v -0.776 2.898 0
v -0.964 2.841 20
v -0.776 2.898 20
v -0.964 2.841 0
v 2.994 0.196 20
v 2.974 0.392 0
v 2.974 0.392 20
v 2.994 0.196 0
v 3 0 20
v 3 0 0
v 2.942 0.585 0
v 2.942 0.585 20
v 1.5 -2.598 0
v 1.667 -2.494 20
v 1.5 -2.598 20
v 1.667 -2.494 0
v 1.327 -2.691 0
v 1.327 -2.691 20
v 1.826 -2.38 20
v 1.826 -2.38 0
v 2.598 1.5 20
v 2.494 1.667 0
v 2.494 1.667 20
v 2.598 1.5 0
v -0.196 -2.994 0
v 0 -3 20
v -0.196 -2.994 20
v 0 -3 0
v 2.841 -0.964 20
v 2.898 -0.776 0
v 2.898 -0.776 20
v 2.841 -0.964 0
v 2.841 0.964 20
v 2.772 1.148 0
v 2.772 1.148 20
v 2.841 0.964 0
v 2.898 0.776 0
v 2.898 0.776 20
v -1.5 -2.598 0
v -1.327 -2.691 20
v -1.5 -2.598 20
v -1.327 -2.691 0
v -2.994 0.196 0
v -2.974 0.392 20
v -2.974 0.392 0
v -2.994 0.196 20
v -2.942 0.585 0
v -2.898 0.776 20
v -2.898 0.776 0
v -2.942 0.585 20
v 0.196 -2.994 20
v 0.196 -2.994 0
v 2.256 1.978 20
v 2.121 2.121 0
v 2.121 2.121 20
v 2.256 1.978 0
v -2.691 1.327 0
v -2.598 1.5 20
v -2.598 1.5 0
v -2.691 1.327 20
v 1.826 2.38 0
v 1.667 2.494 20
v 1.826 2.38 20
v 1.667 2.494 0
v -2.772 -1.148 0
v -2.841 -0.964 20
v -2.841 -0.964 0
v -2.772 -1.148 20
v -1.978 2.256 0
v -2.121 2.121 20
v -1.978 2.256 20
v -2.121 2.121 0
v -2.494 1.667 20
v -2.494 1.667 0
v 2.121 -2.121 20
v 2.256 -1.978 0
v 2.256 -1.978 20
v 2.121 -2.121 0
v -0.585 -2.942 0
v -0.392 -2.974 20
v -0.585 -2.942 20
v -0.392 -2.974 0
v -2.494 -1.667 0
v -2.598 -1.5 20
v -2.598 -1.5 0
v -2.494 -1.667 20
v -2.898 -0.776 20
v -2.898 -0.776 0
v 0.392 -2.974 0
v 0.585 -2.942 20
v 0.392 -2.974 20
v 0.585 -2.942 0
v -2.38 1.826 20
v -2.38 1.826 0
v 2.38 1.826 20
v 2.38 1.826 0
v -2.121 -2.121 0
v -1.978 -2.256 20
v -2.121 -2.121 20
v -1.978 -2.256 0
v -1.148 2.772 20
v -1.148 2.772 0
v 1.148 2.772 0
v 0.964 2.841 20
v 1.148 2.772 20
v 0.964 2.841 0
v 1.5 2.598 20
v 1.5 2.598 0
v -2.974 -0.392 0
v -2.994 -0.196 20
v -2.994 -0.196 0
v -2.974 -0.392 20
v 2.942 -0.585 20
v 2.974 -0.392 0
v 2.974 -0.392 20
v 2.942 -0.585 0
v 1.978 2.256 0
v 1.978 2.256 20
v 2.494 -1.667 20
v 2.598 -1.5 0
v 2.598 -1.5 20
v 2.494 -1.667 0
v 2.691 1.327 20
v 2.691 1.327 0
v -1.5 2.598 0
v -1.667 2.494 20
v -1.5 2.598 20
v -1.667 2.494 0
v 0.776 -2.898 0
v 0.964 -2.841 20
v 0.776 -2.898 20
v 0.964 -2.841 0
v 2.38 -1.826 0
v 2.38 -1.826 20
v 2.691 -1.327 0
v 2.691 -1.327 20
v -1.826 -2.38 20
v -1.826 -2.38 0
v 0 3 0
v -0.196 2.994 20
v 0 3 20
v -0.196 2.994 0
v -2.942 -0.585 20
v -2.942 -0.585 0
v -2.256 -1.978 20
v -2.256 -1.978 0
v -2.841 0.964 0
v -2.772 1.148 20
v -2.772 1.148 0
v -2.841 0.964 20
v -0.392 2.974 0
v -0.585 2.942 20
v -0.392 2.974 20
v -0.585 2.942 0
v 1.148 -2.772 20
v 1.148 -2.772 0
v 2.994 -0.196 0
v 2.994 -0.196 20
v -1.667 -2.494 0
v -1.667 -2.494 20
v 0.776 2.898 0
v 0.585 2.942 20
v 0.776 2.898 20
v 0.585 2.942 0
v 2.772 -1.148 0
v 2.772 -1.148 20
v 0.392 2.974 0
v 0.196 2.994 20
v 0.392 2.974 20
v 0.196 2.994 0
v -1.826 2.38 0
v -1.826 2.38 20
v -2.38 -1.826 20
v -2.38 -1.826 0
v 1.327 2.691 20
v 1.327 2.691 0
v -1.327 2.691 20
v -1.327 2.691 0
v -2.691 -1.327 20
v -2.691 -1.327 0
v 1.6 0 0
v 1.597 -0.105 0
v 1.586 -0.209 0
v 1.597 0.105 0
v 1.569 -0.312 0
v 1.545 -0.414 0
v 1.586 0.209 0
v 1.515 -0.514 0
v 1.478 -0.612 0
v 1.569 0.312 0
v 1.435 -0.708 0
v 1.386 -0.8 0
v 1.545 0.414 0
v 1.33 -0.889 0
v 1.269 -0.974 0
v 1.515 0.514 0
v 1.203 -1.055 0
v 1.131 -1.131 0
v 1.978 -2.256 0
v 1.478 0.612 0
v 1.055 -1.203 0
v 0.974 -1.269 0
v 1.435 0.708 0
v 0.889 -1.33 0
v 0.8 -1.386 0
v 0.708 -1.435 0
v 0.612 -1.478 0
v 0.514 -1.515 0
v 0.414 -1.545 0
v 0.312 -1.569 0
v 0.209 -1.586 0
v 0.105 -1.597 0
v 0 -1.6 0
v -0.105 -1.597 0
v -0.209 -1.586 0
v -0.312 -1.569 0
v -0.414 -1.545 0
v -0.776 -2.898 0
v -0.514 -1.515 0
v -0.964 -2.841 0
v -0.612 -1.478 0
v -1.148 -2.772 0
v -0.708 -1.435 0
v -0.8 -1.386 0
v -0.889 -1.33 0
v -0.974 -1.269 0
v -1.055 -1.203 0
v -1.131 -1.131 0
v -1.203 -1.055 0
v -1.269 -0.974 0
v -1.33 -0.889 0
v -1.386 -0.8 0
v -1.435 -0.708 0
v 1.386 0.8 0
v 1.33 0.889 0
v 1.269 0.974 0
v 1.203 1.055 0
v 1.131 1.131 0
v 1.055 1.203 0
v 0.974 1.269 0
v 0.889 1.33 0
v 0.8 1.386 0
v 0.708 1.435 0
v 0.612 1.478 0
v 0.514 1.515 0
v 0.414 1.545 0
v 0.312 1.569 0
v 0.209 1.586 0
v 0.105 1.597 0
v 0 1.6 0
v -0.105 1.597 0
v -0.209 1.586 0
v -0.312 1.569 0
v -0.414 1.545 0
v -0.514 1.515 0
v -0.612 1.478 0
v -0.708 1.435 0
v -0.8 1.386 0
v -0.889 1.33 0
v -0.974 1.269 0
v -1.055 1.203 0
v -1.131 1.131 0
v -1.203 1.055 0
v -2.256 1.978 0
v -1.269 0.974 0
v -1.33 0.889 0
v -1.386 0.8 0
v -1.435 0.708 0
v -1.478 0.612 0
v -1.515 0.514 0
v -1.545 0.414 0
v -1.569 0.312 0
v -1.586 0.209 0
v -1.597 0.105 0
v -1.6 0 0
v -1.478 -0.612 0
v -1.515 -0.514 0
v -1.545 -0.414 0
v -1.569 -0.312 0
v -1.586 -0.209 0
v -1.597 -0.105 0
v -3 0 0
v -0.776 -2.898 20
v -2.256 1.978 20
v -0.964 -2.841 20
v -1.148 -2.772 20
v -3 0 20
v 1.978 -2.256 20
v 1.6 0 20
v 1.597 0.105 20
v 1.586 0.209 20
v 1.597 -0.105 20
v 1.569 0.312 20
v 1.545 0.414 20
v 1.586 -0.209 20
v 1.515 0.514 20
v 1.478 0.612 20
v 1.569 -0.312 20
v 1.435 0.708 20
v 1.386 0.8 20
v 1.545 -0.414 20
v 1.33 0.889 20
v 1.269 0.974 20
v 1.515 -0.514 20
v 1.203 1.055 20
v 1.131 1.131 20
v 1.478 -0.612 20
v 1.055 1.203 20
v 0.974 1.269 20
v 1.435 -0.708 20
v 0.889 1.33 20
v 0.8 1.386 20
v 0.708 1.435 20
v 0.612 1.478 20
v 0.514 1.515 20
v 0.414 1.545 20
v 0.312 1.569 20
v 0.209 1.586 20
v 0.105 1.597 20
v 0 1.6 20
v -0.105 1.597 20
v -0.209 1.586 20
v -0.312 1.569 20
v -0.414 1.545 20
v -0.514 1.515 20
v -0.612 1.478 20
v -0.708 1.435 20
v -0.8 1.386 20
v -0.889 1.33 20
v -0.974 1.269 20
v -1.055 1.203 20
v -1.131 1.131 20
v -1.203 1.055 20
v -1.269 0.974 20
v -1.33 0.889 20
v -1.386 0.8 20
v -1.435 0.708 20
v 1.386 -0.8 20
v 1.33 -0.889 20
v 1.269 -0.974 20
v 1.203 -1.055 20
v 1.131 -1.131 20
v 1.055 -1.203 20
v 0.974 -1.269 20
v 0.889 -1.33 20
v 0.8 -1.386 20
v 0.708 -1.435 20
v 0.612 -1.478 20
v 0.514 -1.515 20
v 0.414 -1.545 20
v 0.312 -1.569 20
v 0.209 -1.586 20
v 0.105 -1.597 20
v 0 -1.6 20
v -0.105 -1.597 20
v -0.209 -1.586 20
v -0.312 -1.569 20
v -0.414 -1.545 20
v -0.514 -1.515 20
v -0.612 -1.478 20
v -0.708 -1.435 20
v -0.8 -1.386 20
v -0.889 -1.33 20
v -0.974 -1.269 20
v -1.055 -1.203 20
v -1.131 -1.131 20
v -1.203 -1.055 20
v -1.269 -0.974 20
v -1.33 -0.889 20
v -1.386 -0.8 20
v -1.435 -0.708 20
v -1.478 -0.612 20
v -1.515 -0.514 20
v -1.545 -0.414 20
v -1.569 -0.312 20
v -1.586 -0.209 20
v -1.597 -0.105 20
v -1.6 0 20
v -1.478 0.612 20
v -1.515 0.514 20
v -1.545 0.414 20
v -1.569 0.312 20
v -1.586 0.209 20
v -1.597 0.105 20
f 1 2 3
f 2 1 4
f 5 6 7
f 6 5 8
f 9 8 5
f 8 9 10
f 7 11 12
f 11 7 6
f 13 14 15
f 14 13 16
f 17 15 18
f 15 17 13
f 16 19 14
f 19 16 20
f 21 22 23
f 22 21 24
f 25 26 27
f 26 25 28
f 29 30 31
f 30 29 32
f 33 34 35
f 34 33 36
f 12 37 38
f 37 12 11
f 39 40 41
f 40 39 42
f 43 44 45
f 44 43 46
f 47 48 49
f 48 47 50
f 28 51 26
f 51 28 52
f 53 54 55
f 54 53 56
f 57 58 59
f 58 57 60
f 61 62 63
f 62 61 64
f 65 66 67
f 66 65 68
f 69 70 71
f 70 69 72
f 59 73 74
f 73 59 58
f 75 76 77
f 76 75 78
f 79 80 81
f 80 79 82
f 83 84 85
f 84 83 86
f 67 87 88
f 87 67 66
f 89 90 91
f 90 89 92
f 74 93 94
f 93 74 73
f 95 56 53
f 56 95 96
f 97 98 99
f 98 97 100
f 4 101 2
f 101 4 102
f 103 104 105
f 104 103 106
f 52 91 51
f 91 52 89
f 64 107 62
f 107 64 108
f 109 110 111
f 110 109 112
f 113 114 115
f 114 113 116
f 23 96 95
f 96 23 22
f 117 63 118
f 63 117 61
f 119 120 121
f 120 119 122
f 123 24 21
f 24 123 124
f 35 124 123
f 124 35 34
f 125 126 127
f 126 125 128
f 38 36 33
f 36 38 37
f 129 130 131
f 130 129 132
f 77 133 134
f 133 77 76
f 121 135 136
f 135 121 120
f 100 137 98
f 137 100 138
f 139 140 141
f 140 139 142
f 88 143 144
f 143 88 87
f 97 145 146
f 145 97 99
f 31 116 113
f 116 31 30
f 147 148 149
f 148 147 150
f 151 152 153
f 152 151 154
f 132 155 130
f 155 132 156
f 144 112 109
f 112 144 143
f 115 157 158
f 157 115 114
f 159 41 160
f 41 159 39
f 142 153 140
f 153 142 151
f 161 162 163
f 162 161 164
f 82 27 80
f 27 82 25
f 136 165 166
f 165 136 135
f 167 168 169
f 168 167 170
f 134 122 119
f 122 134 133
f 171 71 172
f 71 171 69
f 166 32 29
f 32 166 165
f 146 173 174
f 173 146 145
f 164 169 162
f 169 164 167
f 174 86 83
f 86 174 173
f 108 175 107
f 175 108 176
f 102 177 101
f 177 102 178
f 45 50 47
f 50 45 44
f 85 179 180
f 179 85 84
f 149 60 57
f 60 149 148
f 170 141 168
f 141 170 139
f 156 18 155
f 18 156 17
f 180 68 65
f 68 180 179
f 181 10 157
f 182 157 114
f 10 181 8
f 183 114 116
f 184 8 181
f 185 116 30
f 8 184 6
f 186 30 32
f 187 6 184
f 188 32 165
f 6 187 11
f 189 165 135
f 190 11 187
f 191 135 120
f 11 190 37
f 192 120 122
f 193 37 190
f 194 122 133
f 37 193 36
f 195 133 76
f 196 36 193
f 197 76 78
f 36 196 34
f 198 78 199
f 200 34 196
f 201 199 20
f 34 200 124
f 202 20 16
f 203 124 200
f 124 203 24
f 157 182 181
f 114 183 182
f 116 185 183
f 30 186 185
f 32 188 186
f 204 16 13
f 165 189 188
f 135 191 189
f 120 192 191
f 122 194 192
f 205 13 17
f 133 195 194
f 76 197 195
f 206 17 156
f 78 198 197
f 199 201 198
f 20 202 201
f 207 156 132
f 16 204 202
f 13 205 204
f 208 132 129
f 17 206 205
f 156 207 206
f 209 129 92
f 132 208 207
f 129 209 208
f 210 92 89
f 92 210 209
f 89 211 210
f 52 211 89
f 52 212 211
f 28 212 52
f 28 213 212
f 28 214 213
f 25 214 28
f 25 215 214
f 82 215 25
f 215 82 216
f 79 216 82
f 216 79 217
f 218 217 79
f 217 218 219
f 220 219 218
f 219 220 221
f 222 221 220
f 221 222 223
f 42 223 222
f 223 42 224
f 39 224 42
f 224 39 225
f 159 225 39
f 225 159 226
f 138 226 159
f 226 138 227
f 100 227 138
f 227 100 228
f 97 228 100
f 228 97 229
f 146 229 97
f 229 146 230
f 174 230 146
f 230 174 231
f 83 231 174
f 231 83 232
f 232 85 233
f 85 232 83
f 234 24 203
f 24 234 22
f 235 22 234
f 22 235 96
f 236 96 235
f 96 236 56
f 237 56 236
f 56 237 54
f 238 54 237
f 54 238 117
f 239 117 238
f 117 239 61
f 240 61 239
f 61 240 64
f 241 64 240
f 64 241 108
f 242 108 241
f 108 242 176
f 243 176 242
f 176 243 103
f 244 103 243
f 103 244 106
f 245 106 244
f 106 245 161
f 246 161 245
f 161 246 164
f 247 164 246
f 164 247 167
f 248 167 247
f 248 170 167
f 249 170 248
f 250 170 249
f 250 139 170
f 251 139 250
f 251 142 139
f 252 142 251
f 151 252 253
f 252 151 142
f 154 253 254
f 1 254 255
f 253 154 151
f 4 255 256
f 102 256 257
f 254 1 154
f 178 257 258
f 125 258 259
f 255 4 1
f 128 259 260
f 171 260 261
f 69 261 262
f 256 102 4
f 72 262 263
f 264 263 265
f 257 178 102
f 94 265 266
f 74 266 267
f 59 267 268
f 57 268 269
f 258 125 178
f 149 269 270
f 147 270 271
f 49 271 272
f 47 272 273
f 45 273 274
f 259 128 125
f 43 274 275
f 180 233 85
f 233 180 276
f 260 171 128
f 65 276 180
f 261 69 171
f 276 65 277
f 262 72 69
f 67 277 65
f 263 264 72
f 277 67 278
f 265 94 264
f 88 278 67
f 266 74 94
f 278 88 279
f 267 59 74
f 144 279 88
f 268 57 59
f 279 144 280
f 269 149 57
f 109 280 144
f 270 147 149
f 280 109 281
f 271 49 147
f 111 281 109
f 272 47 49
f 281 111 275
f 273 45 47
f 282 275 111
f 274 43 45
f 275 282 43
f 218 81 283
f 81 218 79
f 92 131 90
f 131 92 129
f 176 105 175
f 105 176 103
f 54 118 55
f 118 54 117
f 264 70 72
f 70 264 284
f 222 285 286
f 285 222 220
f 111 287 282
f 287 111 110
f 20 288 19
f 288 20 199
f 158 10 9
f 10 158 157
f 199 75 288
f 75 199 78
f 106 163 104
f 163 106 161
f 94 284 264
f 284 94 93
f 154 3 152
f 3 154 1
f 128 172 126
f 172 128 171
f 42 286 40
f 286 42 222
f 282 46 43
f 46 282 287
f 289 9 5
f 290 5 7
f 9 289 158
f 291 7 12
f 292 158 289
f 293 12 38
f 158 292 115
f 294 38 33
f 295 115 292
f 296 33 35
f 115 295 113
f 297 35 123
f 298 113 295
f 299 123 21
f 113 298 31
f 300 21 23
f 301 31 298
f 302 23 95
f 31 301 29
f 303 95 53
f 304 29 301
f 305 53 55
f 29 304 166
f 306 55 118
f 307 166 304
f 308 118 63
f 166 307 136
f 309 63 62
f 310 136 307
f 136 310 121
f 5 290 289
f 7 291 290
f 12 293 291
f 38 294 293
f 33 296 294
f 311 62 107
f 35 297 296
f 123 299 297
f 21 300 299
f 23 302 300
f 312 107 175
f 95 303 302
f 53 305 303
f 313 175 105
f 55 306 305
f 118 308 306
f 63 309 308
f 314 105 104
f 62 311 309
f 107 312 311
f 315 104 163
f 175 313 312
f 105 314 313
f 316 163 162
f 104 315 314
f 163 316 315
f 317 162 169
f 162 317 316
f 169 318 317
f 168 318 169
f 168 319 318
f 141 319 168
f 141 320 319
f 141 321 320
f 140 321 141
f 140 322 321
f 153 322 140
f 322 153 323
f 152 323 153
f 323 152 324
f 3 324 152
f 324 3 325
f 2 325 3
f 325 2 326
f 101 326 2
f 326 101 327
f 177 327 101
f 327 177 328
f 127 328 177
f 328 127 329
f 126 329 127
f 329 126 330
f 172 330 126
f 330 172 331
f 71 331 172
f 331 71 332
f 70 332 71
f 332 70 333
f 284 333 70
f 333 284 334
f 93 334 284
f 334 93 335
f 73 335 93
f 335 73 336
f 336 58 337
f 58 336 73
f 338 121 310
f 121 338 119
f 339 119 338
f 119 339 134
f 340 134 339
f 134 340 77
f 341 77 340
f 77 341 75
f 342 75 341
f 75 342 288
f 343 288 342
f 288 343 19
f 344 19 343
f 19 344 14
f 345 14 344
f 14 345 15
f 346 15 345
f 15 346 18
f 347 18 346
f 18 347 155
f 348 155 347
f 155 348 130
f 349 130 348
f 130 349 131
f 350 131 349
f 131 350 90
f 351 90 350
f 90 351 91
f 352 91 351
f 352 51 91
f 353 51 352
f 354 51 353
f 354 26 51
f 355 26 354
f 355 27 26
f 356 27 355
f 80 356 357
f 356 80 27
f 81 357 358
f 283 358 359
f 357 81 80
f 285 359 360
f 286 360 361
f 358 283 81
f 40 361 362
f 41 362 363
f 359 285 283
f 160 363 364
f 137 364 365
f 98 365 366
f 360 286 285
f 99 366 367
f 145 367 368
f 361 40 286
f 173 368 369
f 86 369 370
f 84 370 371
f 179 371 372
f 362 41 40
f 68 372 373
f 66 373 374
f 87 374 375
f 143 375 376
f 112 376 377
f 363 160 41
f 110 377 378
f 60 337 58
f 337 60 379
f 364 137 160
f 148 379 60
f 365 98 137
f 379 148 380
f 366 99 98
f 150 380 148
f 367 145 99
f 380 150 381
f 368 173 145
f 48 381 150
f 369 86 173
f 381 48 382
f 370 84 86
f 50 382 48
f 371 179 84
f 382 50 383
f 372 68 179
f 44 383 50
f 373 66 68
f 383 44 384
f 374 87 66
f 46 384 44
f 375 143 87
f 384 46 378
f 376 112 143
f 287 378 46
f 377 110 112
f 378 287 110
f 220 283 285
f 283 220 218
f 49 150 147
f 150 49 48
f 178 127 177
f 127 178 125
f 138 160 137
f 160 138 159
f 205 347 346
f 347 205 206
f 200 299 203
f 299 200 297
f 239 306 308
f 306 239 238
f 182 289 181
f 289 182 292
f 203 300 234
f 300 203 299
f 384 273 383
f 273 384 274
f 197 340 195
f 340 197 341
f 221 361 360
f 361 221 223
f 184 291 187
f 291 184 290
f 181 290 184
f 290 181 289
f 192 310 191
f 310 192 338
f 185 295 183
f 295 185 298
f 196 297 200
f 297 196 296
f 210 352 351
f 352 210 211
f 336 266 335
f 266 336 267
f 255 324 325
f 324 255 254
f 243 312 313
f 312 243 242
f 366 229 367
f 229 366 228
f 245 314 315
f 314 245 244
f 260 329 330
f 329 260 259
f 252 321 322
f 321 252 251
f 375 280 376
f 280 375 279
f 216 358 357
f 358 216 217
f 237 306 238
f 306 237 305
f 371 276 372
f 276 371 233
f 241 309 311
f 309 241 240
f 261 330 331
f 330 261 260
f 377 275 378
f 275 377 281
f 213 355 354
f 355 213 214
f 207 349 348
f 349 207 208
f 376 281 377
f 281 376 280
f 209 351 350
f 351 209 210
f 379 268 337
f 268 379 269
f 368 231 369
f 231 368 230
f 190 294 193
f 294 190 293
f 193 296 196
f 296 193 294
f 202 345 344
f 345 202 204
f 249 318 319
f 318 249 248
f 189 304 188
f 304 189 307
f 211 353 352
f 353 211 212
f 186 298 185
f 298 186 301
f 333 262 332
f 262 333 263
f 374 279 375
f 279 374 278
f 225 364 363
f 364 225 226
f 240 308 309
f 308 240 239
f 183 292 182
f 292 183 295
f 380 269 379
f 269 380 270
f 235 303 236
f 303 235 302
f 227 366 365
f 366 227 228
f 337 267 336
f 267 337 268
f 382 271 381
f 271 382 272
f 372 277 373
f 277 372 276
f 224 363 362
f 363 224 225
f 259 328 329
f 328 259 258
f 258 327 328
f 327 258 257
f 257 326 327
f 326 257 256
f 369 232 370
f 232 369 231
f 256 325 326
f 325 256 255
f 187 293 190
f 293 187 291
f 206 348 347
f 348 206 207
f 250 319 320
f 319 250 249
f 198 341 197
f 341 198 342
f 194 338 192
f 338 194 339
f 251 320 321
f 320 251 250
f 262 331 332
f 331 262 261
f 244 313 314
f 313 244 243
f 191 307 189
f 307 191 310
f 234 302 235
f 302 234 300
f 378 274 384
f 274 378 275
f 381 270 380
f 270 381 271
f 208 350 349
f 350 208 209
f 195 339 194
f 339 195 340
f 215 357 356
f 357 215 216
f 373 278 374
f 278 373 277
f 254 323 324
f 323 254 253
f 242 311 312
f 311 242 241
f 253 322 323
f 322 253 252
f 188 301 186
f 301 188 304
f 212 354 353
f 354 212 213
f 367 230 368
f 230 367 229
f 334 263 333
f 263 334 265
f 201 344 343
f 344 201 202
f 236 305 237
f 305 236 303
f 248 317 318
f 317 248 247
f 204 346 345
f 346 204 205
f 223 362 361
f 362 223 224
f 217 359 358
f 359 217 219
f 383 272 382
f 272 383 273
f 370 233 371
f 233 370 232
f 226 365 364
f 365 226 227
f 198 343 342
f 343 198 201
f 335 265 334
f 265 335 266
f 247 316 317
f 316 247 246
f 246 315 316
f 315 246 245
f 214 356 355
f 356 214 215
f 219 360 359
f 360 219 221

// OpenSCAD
$fn = 96;

thread_d = 3.0;      // mm (nominal)
length = 20.0;       // mm
outer_d = 6.0;       // mm (fallback since diameter was "None")
hole_clearance = 0.2; // mm added to thread diameter for a simple clearance hole

difference() {
    cylinder(h = length, d = outer_d);
    translate([0, 0, -0.1])
        cylinder(h = length + 0.2, d = thread_d + hole_clearance);
}
